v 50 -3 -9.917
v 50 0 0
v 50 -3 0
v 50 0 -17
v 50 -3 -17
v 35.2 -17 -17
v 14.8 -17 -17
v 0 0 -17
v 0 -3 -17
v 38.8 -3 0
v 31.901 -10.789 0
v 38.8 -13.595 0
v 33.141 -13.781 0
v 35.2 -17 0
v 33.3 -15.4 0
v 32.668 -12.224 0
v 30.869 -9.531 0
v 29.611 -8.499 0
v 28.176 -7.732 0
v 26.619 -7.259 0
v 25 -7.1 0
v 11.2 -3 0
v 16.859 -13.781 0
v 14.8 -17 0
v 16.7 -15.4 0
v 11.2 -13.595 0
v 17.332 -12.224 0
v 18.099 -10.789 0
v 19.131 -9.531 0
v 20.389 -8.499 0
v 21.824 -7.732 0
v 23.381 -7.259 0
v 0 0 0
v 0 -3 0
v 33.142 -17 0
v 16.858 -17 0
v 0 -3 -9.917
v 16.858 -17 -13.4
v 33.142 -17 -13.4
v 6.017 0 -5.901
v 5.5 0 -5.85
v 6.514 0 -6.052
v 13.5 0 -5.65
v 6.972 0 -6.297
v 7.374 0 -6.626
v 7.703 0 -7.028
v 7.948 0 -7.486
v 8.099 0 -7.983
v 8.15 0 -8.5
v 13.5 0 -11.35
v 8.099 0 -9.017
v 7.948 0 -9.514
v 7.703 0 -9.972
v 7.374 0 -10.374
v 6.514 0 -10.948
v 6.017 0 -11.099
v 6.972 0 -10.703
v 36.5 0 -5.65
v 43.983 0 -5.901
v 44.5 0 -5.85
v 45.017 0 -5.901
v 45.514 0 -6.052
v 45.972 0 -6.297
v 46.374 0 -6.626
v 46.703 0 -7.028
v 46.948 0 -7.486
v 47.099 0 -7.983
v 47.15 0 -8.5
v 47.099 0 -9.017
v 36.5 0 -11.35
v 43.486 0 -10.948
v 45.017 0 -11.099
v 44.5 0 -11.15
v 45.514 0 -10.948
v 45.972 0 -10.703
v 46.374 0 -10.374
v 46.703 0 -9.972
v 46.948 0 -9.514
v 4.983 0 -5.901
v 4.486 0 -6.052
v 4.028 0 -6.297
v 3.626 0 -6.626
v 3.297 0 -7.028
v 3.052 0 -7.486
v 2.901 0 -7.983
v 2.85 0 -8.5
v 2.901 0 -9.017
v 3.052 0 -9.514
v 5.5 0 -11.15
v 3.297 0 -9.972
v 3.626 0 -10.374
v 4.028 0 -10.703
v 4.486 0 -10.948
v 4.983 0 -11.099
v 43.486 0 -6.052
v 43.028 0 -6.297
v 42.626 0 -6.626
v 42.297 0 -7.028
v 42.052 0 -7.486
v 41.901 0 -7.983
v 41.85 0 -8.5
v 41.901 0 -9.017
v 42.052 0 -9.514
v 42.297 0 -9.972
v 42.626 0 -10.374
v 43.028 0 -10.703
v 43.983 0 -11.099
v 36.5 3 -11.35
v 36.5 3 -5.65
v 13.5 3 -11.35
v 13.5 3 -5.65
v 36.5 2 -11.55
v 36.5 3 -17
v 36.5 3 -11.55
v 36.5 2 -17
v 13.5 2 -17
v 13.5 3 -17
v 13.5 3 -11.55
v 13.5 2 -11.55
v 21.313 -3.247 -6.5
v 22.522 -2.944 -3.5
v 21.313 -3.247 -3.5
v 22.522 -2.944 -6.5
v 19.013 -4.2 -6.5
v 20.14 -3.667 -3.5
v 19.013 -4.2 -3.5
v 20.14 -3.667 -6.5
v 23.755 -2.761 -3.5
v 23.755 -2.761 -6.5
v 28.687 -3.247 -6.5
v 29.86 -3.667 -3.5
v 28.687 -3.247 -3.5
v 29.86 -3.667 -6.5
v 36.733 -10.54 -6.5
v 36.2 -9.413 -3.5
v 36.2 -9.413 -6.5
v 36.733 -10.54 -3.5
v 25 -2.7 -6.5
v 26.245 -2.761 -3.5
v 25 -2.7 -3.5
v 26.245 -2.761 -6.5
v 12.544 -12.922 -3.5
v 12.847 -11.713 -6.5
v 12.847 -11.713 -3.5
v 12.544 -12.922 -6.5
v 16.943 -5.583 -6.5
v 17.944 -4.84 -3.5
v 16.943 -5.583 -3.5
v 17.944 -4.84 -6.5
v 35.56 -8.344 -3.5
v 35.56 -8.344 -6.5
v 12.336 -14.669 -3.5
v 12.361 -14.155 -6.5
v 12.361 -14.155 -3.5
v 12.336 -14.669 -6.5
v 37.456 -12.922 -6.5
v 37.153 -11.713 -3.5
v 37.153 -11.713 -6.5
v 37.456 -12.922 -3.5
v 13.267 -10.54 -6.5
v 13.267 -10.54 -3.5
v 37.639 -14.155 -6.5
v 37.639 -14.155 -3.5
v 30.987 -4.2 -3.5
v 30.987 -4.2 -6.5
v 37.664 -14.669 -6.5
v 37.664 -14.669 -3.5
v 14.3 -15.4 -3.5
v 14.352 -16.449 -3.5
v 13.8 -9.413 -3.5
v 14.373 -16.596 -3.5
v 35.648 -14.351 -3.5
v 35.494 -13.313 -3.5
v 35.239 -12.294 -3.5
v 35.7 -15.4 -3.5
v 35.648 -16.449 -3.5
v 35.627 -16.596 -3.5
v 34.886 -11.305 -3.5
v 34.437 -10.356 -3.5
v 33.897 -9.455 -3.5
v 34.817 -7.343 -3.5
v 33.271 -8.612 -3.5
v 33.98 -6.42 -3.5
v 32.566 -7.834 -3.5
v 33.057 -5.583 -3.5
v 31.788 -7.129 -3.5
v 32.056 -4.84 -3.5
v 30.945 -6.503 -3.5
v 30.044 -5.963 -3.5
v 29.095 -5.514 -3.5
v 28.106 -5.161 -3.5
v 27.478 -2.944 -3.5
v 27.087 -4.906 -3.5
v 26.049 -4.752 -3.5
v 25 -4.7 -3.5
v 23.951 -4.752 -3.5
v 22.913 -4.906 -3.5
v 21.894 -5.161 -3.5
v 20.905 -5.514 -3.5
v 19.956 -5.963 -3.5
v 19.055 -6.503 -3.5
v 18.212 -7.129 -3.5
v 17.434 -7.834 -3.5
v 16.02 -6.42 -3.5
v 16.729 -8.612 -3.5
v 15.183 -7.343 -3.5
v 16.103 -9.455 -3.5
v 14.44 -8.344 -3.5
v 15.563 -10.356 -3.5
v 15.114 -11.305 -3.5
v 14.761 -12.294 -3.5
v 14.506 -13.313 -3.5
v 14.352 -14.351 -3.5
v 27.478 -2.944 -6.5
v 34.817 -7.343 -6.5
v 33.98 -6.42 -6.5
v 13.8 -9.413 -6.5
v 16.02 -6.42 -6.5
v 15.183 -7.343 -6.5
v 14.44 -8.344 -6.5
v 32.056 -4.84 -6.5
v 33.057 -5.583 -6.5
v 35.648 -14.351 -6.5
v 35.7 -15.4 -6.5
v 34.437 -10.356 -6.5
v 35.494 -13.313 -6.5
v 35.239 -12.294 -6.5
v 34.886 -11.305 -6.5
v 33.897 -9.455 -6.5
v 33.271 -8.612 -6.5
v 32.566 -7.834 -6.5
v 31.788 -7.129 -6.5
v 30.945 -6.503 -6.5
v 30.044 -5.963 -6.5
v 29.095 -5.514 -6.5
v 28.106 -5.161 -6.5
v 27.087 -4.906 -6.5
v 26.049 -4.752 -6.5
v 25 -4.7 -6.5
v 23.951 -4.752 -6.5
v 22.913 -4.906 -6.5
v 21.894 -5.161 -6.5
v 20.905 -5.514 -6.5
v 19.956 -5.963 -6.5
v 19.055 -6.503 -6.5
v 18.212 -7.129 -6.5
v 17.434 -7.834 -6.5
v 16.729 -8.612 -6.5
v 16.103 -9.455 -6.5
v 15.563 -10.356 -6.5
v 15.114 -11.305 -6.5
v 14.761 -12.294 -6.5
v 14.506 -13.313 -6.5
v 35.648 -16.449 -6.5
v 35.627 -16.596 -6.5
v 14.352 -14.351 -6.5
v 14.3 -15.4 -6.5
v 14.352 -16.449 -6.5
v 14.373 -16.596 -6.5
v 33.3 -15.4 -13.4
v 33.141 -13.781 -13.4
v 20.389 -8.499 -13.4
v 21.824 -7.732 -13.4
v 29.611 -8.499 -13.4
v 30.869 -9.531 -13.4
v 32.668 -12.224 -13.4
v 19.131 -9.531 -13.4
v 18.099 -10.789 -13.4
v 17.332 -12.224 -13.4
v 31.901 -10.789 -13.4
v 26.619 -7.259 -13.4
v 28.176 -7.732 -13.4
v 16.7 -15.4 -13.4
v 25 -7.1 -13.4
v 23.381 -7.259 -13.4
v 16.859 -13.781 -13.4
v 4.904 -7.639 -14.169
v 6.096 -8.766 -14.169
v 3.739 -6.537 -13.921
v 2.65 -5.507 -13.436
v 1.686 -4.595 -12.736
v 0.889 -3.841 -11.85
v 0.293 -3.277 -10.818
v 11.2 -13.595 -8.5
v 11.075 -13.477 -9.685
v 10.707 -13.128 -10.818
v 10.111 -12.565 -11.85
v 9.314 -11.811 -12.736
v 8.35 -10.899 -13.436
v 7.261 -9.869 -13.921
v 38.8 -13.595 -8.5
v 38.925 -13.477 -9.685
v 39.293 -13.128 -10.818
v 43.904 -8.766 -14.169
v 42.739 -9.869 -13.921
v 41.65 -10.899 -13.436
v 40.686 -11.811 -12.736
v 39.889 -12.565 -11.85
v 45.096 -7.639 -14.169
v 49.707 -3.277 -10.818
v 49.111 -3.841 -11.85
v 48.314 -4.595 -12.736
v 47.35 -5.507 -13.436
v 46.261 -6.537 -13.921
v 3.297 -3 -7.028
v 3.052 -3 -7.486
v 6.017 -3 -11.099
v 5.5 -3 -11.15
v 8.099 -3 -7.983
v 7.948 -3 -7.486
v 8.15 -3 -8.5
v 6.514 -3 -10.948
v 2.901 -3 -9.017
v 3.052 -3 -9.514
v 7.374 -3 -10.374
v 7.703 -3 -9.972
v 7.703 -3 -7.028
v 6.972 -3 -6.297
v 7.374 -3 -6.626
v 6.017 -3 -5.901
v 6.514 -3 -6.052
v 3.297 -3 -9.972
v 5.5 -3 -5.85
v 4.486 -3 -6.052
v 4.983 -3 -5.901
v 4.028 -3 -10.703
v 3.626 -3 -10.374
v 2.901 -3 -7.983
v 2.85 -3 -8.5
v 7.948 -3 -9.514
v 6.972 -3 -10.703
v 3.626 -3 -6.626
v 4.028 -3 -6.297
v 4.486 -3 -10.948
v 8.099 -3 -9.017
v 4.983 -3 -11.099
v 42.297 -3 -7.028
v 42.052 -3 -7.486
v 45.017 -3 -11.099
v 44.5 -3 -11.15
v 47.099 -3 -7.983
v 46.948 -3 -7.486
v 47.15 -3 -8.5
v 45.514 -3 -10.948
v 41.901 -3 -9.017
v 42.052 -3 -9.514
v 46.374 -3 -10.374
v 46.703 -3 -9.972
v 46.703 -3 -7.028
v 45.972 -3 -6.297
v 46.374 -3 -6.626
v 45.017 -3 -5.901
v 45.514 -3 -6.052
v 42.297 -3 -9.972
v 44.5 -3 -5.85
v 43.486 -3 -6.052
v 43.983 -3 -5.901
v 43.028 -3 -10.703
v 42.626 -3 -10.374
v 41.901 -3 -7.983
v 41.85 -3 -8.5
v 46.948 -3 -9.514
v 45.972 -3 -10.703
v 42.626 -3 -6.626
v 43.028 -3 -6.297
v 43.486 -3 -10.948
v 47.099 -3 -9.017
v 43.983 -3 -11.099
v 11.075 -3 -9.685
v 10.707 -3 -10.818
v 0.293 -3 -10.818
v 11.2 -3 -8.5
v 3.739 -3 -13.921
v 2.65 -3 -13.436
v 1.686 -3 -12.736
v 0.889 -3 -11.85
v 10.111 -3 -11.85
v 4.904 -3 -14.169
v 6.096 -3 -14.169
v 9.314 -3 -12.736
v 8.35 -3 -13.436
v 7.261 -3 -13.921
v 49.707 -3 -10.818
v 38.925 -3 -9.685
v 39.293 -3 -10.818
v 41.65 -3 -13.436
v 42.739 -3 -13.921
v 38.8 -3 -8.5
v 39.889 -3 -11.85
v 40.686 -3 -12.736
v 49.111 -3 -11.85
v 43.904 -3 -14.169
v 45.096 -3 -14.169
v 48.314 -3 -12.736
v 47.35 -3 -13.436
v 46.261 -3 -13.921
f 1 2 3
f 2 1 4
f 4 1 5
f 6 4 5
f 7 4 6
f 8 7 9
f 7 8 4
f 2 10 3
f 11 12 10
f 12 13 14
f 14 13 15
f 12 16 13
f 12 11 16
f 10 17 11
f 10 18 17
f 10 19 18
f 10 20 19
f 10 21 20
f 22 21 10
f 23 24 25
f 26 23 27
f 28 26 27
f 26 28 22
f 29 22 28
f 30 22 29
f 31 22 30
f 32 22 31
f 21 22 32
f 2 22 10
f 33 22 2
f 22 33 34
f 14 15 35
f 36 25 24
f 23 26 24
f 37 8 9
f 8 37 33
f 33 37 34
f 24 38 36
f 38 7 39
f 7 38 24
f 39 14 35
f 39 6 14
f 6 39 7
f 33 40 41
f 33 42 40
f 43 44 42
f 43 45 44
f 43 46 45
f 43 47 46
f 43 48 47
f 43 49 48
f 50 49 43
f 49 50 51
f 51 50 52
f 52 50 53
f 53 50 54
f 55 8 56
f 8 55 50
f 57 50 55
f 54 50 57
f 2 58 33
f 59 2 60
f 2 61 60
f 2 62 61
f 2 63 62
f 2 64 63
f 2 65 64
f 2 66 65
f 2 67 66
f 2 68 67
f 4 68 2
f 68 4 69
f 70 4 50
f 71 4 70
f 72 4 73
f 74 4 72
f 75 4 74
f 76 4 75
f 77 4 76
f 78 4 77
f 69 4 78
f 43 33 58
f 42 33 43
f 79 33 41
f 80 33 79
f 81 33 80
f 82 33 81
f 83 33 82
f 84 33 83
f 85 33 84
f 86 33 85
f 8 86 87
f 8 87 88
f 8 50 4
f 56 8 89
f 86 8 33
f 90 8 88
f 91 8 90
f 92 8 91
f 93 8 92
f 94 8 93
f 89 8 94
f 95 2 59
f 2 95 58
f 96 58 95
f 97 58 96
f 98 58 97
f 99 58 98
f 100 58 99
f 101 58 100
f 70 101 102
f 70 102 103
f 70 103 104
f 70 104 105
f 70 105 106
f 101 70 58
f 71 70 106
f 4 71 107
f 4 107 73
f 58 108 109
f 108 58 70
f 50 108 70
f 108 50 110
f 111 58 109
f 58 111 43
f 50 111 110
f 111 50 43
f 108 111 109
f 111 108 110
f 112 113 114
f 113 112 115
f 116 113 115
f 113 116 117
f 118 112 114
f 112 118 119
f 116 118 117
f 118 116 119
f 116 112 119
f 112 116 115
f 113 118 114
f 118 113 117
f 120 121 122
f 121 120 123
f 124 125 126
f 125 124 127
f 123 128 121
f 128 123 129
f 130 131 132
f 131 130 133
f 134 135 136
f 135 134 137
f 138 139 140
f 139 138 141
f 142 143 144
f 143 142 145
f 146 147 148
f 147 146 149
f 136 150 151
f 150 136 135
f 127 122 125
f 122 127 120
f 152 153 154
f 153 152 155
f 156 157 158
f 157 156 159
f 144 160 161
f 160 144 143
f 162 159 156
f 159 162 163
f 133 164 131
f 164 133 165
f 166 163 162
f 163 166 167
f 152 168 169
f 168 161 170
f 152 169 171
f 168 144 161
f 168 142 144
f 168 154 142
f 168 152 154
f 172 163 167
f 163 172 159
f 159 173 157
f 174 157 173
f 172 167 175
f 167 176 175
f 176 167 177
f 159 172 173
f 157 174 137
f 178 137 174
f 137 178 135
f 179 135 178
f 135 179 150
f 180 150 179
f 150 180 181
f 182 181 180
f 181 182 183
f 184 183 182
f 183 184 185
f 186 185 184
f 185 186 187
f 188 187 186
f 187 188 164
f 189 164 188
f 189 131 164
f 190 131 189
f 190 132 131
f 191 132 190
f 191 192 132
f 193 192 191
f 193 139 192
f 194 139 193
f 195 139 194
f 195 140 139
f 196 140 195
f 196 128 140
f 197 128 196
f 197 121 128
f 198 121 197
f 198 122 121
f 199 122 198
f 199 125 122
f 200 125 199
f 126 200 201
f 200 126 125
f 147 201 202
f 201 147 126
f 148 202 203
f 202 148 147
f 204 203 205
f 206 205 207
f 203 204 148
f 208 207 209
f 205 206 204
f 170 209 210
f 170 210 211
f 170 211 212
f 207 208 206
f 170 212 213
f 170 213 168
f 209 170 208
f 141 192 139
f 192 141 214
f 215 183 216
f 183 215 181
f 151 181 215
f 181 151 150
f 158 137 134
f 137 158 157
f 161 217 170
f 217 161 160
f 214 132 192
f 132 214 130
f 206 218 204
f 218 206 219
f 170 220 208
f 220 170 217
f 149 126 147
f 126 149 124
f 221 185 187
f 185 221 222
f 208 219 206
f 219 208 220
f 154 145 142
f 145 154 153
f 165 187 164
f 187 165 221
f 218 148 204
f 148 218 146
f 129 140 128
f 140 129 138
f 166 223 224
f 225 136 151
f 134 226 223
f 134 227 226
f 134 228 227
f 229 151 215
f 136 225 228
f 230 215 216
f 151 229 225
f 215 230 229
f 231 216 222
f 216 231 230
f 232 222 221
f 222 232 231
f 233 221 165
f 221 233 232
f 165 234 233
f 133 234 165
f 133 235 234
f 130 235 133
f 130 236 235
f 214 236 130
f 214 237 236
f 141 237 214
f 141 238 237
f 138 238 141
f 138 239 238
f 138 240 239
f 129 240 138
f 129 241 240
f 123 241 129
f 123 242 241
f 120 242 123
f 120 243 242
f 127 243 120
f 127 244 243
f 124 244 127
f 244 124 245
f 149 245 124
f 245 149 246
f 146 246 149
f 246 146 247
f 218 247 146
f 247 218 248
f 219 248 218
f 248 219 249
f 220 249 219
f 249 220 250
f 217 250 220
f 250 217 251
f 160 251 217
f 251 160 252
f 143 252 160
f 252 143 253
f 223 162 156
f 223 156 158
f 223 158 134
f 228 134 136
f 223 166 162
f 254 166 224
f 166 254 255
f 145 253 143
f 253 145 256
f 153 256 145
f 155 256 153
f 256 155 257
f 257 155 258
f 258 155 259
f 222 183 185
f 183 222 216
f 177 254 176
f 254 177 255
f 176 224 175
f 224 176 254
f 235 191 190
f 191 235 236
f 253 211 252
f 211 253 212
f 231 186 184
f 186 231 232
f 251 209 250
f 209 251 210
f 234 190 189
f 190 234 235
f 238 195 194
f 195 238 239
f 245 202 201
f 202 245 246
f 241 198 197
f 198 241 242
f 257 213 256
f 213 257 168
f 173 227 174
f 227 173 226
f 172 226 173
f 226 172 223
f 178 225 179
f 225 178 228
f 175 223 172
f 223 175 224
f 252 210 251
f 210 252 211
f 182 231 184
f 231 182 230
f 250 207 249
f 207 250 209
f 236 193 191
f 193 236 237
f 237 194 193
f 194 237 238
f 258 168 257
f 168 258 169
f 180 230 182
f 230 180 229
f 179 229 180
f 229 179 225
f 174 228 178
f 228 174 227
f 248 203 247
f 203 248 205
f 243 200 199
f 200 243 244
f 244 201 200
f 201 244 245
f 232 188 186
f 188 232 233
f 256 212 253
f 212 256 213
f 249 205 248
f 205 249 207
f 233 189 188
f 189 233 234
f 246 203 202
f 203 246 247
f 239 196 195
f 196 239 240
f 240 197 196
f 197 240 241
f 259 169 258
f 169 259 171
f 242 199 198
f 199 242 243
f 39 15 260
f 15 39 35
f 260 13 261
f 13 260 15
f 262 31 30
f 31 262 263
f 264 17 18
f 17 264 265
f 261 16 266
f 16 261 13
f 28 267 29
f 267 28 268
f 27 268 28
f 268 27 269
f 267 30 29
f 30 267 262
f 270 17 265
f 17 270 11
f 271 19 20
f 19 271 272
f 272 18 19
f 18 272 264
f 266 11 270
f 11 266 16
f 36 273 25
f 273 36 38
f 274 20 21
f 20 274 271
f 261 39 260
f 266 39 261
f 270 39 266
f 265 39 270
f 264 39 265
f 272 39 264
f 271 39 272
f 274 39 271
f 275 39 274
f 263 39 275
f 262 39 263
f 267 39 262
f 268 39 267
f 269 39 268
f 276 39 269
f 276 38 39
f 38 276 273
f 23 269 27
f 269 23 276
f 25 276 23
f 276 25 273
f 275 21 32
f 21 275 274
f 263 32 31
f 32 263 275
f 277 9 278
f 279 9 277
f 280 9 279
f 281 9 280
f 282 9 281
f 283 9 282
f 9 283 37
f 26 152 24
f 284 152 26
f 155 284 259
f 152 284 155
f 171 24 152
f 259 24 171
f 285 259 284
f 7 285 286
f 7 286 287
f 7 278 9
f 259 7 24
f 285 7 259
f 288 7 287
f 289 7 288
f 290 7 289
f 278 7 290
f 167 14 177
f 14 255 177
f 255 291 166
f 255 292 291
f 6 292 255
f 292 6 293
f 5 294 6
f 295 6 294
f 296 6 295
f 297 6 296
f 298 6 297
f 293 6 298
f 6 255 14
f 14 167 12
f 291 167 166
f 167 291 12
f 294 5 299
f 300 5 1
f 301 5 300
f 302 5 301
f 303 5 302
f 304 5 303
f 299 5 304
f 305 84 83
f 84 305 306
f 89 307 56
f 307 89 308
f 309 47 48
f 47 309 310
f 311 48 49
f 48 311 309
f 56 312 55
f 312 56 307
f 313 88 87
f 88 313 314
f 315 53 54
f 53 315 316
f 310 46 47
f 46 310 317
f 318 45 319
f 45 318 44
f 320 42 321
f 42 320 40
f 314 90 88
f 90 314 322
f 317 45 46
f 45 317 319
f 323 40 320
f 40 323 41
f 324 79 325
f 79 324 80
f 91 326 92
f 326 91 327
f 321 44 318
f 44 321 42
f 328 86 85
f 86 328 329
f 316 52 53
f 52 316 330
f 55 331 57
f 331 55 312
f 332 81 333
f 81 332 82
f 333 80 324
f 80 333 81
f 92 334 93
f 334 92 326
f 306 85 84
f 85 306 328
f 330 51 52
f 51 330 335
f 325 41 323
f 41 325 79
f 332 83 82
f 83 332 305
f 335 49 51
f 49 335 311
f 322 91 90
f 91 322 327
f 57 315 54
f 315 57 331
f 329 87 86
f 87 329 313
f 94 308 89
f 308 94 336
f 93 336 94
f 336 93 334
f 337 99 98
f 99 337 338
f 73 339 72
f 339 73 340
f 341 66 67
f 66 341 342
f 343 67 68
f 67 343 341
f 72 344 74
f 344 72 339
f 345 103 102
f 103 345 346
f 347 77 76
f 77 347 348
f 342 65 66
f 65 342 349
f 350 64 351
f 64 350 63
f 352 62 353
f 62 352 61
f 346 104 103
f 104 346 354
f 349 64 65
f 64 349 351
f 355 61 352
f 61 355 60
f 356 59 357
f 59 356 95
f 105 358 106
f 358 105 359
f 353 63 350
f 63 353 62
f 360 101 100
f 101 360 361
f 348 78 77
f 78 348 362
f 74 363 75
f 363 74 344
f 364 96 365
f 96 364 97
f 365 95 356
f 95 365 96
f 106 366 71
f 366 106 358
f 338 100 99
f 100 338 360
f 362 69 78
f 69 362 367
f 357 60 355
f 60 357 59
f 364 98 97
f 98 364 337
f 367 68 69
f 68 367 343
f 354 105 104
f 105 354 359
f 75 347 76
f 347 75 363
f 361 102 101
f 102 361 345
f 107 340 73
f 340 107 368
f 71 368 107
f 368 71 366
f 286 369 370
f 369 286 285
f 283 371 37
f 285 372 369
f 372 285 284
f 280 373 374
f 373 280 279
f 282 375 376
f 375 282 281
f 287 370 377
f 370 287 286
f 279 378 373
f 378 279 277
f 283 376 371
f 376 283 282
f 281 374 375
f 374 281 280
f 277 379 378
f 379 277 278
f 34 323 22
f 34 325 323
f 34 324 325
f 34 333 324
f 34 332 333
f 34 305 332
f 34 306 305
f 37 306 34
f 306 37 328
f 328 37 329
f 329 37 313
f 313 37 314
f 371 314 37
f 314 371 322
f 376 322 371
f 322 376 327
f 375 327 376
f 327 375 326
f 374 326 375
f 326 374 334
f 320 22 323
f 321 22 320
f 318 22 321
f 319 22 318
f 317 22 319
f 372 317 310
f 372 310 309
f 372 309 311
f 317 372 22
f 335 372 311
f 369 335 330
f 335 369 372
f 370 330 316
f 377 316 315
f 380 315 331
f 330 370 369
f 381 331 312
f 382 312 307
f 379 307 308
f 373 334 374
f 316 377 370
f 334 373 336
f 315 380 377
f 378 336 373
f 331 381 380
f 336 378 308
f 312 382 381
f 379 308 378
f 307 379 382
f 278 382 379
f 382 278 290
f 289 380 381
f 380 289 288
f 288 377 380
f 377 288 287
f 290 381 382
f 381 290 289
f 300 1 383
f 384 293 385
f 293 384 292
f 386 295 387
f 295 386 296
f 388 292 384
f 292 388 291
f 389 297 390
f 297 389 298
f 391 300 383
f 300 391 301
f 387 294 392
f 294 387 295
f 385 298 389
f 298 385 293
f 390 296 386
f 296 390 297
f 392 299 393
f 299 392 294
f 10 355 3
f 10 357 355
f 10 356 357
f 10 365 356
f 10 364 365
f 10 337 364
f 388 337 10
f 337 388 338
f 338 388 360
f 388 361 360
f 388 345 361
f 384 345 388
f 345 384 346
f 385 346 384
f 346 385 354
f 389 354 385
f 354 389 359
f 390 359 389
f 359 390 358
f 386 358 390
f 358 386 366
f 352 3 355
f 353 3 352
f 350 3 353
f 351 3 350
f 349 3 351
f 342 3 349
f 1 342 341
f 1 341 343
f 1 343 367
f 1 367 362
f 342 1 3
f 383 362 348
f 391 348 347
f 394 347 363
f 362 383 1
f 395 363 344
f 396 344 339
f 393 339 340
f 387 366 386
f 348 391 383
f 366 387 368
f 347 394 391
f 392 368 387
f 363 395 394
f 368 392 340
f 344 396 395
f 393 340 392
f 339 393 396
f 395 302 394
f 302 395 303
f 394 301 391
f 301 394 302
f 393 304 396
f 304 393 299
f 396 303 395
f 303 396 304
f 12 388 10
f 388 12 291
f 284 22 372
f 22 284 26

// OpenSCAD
// RebeliX
//
// y-rod-holder
// GNU GPL v3
// Martin Neruda <neruda@reprap4u.cz>
// http://www.reprap4u.cz
// Modified by Andras Biro

/* [Screw] */

//Diameter of the screw head. 1mm additional spacing recommended
screw_head_diameter = 11.4;
//Diameter of the screw hole. 0.2 - 0.5mm additional spacing recommended
screw_diameter = 5.3;
//Width of the hammer nut. 1mm additional spacing recommended
hammer_nut_width = 16;
//Distance of screw hole center from the edge
holes_from_edge = 5.5;

/* [Base shape] */

width = 50;
height = 17;
base_thickness = 3;
thickness = 17;
rod_diameter = 16.4;
//Distance of the zip tie from the middle
zip_tie_offset = 3;

/* [Extrusion profile settings] */
//Width of the notch in the extrusion
slot_width = 5.7;
//Depth of the plastic that goes to the extrusion
slot_depth = 3;
//Enable or disable the support for the plastic that goes to the extrusion
with_support = 1; //[1:Enable, 0:Disable]
//Distance between the support and the part. Recommended to use the print layer height
support_distance = 0.2;

module y_rod_holder_base(){
  //base shape
  cube([width,thickness,height]);
  //notch to the extrusion
  notch_width = width-2*(holes_from_edge+hammer_nut_width/2);
  translate([width/2,0,height/2]) cube([notch_width,slot_depth*2,slot_width],center=true);
  //support
  if ( with_support ) {
    support_height = (height-slot_width)/2-support_distance;
    translate([width/2-notch_width/2,-slot_depth,height-support_height]) cube([notch_width,1,support_height]);
  }
}

module y_cuts(){
  // rod slot
  translate([width/2,thickness - 1.6,-0.1]) cylinder(h=(height/2)+5,r=(rod_diameter/2)+0.1,$fn = 32);
  // cut triangles from the sides
  cut_triangle_adj = (width-rod_diameter)/2-2;
  cut_triangle_opp = thickness-base_thickness;
  cut_triangle_hyp=sqrt(pow(cut_triangle_adj,2)+pow(cut_triangle_opp,2));
  angle = atan2(cut_triangle_opp,cut_triangle_adj);
  translate([0,base_thickness,0]) rotate([0,0,angle]) cube([cut_triangle_hyp,20,height]);
  translate([width-cut_triangle_adj,thickness,0]) rotate([0,0,-angle]) cube([cut_triangle_hyp,20,height]);

  //screw holes
  translate([holes_from_edge,0,height/2]) rotate([-90,0,0]) cylinder(h=40,r=screw_diameter/2,$fn = 32,center=true);
  translate([width-holes_from_edge,0,height/2]) rotate([-90,0,0]) cylinder(h=40,r=screw_diameter/2,$fn = 32,center=true);
  //deepen for screw heads
  translate([holes_from_edge,base_thickness,height/2]) rotate([-90,0,0]) cylinder(r = screw_head_diameter/2, h = 20, $fn = 30);
  translate([width-holes_from_edge,base_thickness,height/2]) rotate([-90,0,0]) cylinder(r = screw_head_diameter/2, h = 20, $fn = 30);
 
  //extend screw head deepening towards the printer
  translate([width-holes_from_edge-screw_head_diameter/2,base_thickness,0]) cube([screw_head_diameter,20,height/2]);
  translate([holes_from_edge-screw_head_diameter/2,base_thickness,0]) cube([screw_head_diameter,20,height/2]);
  
  // zip tie
  translate([width/2,thickness - 1.6,height/2 - zip_tie_offset - 2]) difference(){
    cylinder(r=rod_diameter/2+4.5,h=3,$fn=64);
    cylinder(r=rod_diameter/2+2.5,h=3.1,$fn=64);
  }
}

rotate([180,0,0]) 
difference(){
	y_rod_holder_base();
	y_cuts();
}	
